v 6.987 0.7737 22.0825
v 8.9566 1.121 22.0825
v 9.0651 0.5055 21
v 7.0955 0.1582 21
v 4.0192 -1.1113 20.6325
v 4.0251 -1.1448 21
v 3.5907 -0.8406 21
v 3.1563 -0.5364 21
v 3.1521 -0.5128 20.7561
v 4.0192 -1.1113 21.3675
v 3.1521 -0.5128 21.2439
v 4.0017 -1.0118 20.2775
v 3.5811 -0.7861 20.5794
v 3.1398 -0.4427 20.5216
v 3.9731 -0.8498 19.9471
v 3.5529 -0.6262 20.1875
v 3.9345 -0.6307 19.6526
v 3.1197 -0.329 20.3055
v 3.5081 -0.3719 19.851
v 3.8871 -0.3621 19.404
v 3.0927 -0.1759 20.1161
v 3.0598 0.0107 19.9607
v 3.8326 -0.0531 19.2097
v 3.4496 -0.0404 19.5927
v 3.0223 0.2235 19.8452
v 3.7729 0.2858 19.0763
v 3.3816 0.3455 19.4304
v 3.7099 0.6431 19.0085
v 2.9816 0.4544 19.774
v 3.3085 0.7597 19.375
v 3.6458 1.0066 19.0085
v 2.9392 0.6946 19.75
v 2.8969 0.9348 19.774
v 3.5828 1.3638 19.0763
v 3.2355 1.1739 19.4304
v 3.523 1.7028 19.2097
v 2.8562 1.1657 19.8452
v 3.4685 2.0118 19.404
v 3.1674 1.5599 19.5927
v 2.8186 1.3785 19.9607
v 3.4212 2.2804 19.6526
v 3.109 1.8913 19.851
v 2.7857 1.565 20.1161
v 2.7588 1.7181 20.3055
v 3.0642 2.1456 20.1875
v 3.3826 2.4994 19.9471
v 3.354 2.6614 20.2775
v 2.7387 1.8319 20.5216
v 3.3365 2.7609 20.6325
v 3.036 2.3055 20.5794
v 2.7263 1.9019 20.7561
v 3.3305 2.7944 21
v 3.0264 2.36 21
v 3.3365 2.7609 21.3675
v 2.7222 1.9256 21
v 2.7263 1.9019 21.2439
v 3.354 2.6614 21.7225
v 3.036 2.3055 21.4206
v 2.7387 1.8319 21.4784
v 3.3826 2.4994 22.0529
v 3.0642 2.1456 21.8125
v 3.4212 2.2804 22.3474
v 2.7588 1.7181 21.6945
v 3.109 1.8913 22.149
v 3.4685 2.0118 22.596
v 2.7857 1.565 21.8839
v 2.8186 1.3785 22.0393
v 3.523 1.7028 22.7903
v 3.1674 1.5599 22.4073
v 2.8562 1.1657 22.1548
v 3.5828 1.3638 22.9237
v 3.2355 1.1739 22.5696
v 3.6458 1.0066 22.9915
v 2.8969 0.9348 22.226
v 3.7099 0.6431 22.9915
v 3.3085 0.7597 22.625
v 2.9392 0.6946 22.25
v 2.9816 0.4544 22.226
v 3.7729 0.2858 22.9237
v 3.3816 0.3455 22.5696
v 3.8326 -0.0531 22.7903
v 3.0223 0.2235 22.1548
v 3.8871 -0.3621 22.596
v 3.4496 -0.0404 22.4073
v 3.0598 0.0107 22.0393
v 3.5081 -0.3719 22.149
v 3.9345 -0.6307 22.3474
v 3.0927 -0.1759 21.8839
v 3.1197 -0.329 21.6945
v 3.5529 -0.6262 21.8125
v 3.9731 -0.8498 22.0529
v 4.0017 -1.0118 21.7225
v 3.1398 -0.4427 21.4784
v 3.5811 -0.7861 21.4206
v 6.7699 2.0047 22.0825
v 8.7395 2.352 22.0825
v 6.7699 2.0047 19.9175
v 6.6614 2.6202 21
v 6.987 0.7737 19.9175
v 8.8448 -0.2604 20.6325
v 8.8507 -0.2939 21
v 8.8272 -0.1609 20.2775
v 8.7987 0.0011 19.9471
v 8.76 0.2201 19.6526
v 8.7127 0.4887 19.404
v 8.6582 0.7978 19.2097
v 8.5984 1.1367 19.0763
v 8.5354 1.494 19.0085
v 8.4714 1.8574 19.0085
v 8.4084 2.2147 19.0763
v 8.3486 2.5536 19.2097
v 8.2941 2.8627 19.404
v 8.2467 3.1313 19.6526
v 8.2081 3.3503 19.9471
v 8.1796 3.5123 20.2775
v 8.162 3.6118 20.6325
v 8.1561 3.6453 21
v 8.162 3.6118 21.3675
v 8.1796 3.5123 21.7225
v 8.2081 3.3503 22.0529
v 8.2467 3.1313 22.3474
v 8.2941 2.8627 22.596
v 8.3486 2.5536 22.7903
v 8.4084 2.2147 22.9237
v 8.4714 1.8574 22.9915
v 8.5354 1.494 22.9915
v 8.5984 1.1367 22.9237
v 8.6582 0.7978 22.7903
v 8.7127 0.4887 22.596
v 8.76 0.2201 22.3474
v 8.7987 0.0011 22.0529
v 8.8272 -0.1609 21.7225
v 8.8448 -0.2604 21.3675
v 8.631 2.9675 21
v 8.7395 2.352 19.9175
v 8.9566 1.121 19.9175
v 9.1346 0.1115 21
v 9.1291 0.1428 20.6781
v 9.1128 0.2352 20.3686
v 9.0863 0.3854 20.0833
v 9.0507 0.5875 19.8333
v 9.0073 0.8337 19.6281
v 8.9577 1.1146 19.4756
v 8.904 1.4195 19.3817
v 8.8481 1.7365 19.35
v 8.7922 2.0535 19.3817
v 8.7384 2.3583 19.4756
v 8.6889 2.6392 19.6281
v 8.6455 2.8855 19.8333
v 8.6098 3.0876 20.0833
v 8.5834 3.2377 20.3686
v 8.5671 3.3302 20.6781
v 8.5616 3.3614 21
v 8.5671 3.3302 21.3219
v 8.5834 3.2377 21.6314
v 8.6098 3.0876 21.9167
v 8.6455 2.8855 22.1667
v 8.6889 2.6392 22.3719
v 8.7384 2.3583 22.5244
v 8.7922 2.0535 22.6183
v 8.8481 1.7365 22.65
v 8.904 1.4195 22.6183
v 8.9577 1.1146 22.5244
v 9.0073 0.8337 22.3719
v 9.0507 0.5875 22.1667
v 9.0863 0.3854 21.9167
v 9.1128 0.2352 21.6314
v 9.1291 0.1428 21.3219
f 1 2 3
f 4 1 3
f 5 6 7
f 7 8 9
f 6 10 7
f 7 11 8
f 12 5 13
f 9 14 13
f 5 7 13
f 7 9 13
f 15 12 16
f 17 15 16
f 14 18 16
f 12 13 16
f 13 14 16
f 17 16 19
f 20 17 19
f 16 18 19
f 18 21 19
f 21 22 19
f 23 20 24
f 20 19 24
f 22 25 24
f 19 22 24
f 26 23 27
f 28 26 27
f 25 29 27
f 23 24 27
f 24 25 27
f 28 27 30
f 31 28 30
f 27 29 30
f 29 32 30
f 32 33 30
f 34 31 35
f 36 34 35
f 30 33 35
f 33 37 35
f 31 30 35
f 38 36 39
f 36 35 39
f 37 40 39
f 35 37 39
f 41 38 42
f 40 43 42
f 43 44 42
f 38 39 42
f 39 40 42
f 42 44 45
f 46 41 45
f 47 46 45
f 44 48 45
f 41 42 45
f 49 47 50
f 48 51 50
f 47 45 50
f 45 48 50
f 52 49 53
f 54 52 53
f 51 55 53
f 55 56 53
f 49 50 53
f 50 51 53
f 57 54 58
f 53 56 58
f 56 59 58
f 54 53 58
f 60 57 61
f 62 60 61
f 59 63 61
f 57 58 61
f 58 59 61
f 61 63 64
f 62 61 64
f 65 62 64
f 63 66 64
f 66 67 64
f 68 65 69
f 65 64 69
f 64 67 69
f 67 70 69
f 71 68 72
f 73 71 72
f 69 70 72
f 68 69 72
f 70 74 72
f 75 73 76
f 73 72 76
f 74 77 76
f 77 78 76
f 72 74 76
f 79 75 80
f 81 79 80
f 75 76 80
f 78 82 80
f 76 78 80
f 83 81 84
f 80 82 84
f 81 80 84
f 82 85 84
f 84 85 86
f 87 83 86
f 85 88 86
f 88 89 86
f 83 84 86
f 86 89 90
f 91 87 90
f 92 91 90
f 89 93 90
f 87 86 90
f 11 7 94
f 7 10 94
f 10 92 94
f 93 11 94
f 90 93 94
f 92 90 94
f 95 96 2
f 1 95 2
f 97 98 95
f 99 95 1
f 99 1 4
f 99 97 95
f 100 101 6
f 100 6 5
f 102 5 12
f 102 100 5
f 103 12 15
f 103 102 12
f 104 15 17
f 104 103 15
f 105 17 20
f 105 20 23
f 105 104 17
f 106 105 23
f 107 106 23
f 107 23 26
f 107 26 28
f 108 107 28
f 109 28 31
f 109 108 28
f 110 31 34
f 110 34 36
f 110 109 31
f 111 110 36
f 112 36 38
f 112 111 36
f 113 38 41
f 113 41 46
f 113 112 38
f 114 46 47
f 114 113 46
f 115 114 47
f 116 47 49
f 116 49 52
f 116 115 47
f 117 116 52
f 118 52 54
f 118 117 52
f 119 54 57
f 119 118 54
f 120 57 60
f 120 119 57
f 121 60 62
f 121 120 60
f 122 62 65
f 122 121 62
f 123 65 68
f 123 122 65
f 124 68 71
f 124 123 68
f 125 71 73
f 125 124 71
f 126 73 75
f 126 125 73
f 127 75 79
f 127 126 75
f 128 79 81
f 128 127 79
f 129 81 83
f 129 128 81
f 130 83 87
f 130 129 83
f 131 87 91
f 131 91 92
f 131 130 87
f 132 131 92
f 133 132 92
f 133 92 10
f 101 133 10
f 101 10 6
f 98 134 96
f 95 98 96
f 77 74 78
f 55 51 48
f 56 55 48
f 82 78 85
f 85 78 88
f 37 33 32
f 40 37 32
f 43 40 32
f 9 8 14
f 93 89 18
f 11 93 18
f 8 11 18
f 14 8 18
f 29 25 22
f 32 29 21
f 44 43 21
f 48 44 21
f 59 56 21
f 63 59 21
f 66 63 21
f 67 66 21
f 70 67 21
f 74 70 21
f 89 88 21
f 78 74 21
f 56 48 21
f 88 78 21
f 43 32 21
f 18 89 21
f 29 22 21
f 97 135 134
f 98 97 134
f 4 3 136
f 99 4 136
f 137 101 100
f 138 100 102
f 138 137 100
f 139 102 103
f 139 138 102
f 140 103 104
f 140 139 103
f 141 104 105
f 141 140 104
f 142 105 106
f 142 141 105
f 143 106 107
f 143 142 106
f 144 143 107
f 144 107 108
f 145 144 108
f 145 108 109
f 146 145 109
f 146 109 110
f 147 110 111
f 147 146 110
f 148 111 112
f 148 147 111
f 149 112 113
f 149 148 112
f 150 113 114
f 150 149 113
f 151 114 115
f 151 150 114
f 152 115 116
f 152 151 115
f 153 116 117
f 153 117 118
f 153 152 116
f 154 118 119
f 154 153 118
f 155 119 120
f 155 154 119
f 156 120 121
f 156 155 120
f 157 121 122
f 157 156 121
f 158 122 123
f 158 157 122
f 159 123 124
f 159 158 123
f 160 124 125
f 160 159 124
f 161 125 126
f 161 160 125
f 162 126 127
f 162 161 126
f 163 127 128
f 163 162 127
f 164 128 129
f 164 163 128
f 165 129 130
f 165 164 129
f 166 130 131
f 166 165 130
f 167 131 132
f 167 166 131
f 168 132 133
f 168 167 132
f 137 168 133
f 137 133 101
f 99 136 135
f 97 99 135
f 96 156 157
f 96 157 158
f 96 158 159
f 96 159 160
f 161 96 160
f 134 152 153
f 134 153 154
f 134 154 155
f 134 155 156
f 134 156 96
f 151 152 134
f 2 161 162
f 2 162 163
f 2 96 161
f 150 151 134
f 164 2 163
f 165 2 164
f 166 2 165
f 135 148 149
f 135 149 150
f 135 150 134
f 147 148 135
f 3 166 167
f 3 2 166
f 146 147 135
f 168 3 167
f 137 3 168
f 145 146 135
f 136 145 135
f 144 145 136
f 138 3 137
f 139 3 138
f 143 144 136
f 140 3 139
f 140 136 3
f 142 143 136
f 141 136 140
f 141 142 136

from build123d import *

# Parameters (mm, degrees)
SKETCH119_W             = 2
SKETCH119_H             = 6
POCKET017_DEPTH         = 2
CHAMFER006_SIZE         = 0.35
CHAMFER007_SIZE         = 0.75
BODY020_PLACEMENT_ANGLE = 90
BODY021_PLACEMENT_ANGLE = 10
BODY024_PLACEMENT_ANGLE = 90


with BuildPart() as part:
    # Sketch119 → Revolution002 (revolve)
    with BuildSketch(Plane.XZ):
        with Locations((-1, 3)):
            Rectangle(SKETCH119_W, SKETCH119_H)
    revolve(axis=Axis((0, 0, 0), (0, 0, 1)))

    # Sketch124 (on Face3 of Revolution002) → Pocket017 (cut)
    with BuildSketch(Plane(origin=(0, 0, 6), x_dir=(-1, 0, 0), z_dir=(0, 0, 1))):
        Polygon((-0.625, -1.0825317547), (0.625, -1.0825317547), (1.25, 0), (0.625, 1.0825317547), (-0.625, 1.0825317547), (-1.25, 0), align=None)
    extrude(amount=-POCKET017_DEPTH, mode=Mode.SUBTRACT)

    # Chamfer006
    chamfer006_edges = [part.edges().sort_by_distance(p)[0] for p in [
        (2, 0, 6),
    ]]
    chamfer(chamfer006_edges, length=CHAMFER006_SIZE)

    # Chamfer007
    chamfer007_edges = [part.edges().sort_by_distance(p)[0] for p in [
        (2, 0, 0),
    ]]
    chamfer(chamfer007_edges, length=CHAMFER007_SIZE)


with BuildPart() as part_1:
    # Body020 placement: moved
    add(part.part.moved(Location((0, -3, 4))).rotate(Axis((0, -3, 4), (1, 0, 0)), BODY020_PLACEMENT_ANGLE))


with BuildPart() as part_2:
    # Clone001 placement: moved
    add(part_1.part.moved(Location((0, -1, 0))))


with BuildPart() as part_3:
    # Body021 placement: moved
    add(part_2.part.moved(Location((-0.1736481777, 0.984807753, 17))).rotate(Axis((-0.1736481777, 0.984807753, 17), (0, 0, 1)), BODY021_PLACEMENT_ANGLE))


with BuildPart() as part_4:
    # Clone003 placement: moved
    add(part_3.part.moved(Location((0.1736481777, -0.984807753, 0))))


with BuildPart() as part_5:
    # Body024 placement: moved
    add(part_4.part.moved(Location((-1, 0, 0))).rotate(Axis((-1, 0, 0), (0, 0, 1)), BODY024_PLACEMENT_ANGLE))


solid = part_5.part
